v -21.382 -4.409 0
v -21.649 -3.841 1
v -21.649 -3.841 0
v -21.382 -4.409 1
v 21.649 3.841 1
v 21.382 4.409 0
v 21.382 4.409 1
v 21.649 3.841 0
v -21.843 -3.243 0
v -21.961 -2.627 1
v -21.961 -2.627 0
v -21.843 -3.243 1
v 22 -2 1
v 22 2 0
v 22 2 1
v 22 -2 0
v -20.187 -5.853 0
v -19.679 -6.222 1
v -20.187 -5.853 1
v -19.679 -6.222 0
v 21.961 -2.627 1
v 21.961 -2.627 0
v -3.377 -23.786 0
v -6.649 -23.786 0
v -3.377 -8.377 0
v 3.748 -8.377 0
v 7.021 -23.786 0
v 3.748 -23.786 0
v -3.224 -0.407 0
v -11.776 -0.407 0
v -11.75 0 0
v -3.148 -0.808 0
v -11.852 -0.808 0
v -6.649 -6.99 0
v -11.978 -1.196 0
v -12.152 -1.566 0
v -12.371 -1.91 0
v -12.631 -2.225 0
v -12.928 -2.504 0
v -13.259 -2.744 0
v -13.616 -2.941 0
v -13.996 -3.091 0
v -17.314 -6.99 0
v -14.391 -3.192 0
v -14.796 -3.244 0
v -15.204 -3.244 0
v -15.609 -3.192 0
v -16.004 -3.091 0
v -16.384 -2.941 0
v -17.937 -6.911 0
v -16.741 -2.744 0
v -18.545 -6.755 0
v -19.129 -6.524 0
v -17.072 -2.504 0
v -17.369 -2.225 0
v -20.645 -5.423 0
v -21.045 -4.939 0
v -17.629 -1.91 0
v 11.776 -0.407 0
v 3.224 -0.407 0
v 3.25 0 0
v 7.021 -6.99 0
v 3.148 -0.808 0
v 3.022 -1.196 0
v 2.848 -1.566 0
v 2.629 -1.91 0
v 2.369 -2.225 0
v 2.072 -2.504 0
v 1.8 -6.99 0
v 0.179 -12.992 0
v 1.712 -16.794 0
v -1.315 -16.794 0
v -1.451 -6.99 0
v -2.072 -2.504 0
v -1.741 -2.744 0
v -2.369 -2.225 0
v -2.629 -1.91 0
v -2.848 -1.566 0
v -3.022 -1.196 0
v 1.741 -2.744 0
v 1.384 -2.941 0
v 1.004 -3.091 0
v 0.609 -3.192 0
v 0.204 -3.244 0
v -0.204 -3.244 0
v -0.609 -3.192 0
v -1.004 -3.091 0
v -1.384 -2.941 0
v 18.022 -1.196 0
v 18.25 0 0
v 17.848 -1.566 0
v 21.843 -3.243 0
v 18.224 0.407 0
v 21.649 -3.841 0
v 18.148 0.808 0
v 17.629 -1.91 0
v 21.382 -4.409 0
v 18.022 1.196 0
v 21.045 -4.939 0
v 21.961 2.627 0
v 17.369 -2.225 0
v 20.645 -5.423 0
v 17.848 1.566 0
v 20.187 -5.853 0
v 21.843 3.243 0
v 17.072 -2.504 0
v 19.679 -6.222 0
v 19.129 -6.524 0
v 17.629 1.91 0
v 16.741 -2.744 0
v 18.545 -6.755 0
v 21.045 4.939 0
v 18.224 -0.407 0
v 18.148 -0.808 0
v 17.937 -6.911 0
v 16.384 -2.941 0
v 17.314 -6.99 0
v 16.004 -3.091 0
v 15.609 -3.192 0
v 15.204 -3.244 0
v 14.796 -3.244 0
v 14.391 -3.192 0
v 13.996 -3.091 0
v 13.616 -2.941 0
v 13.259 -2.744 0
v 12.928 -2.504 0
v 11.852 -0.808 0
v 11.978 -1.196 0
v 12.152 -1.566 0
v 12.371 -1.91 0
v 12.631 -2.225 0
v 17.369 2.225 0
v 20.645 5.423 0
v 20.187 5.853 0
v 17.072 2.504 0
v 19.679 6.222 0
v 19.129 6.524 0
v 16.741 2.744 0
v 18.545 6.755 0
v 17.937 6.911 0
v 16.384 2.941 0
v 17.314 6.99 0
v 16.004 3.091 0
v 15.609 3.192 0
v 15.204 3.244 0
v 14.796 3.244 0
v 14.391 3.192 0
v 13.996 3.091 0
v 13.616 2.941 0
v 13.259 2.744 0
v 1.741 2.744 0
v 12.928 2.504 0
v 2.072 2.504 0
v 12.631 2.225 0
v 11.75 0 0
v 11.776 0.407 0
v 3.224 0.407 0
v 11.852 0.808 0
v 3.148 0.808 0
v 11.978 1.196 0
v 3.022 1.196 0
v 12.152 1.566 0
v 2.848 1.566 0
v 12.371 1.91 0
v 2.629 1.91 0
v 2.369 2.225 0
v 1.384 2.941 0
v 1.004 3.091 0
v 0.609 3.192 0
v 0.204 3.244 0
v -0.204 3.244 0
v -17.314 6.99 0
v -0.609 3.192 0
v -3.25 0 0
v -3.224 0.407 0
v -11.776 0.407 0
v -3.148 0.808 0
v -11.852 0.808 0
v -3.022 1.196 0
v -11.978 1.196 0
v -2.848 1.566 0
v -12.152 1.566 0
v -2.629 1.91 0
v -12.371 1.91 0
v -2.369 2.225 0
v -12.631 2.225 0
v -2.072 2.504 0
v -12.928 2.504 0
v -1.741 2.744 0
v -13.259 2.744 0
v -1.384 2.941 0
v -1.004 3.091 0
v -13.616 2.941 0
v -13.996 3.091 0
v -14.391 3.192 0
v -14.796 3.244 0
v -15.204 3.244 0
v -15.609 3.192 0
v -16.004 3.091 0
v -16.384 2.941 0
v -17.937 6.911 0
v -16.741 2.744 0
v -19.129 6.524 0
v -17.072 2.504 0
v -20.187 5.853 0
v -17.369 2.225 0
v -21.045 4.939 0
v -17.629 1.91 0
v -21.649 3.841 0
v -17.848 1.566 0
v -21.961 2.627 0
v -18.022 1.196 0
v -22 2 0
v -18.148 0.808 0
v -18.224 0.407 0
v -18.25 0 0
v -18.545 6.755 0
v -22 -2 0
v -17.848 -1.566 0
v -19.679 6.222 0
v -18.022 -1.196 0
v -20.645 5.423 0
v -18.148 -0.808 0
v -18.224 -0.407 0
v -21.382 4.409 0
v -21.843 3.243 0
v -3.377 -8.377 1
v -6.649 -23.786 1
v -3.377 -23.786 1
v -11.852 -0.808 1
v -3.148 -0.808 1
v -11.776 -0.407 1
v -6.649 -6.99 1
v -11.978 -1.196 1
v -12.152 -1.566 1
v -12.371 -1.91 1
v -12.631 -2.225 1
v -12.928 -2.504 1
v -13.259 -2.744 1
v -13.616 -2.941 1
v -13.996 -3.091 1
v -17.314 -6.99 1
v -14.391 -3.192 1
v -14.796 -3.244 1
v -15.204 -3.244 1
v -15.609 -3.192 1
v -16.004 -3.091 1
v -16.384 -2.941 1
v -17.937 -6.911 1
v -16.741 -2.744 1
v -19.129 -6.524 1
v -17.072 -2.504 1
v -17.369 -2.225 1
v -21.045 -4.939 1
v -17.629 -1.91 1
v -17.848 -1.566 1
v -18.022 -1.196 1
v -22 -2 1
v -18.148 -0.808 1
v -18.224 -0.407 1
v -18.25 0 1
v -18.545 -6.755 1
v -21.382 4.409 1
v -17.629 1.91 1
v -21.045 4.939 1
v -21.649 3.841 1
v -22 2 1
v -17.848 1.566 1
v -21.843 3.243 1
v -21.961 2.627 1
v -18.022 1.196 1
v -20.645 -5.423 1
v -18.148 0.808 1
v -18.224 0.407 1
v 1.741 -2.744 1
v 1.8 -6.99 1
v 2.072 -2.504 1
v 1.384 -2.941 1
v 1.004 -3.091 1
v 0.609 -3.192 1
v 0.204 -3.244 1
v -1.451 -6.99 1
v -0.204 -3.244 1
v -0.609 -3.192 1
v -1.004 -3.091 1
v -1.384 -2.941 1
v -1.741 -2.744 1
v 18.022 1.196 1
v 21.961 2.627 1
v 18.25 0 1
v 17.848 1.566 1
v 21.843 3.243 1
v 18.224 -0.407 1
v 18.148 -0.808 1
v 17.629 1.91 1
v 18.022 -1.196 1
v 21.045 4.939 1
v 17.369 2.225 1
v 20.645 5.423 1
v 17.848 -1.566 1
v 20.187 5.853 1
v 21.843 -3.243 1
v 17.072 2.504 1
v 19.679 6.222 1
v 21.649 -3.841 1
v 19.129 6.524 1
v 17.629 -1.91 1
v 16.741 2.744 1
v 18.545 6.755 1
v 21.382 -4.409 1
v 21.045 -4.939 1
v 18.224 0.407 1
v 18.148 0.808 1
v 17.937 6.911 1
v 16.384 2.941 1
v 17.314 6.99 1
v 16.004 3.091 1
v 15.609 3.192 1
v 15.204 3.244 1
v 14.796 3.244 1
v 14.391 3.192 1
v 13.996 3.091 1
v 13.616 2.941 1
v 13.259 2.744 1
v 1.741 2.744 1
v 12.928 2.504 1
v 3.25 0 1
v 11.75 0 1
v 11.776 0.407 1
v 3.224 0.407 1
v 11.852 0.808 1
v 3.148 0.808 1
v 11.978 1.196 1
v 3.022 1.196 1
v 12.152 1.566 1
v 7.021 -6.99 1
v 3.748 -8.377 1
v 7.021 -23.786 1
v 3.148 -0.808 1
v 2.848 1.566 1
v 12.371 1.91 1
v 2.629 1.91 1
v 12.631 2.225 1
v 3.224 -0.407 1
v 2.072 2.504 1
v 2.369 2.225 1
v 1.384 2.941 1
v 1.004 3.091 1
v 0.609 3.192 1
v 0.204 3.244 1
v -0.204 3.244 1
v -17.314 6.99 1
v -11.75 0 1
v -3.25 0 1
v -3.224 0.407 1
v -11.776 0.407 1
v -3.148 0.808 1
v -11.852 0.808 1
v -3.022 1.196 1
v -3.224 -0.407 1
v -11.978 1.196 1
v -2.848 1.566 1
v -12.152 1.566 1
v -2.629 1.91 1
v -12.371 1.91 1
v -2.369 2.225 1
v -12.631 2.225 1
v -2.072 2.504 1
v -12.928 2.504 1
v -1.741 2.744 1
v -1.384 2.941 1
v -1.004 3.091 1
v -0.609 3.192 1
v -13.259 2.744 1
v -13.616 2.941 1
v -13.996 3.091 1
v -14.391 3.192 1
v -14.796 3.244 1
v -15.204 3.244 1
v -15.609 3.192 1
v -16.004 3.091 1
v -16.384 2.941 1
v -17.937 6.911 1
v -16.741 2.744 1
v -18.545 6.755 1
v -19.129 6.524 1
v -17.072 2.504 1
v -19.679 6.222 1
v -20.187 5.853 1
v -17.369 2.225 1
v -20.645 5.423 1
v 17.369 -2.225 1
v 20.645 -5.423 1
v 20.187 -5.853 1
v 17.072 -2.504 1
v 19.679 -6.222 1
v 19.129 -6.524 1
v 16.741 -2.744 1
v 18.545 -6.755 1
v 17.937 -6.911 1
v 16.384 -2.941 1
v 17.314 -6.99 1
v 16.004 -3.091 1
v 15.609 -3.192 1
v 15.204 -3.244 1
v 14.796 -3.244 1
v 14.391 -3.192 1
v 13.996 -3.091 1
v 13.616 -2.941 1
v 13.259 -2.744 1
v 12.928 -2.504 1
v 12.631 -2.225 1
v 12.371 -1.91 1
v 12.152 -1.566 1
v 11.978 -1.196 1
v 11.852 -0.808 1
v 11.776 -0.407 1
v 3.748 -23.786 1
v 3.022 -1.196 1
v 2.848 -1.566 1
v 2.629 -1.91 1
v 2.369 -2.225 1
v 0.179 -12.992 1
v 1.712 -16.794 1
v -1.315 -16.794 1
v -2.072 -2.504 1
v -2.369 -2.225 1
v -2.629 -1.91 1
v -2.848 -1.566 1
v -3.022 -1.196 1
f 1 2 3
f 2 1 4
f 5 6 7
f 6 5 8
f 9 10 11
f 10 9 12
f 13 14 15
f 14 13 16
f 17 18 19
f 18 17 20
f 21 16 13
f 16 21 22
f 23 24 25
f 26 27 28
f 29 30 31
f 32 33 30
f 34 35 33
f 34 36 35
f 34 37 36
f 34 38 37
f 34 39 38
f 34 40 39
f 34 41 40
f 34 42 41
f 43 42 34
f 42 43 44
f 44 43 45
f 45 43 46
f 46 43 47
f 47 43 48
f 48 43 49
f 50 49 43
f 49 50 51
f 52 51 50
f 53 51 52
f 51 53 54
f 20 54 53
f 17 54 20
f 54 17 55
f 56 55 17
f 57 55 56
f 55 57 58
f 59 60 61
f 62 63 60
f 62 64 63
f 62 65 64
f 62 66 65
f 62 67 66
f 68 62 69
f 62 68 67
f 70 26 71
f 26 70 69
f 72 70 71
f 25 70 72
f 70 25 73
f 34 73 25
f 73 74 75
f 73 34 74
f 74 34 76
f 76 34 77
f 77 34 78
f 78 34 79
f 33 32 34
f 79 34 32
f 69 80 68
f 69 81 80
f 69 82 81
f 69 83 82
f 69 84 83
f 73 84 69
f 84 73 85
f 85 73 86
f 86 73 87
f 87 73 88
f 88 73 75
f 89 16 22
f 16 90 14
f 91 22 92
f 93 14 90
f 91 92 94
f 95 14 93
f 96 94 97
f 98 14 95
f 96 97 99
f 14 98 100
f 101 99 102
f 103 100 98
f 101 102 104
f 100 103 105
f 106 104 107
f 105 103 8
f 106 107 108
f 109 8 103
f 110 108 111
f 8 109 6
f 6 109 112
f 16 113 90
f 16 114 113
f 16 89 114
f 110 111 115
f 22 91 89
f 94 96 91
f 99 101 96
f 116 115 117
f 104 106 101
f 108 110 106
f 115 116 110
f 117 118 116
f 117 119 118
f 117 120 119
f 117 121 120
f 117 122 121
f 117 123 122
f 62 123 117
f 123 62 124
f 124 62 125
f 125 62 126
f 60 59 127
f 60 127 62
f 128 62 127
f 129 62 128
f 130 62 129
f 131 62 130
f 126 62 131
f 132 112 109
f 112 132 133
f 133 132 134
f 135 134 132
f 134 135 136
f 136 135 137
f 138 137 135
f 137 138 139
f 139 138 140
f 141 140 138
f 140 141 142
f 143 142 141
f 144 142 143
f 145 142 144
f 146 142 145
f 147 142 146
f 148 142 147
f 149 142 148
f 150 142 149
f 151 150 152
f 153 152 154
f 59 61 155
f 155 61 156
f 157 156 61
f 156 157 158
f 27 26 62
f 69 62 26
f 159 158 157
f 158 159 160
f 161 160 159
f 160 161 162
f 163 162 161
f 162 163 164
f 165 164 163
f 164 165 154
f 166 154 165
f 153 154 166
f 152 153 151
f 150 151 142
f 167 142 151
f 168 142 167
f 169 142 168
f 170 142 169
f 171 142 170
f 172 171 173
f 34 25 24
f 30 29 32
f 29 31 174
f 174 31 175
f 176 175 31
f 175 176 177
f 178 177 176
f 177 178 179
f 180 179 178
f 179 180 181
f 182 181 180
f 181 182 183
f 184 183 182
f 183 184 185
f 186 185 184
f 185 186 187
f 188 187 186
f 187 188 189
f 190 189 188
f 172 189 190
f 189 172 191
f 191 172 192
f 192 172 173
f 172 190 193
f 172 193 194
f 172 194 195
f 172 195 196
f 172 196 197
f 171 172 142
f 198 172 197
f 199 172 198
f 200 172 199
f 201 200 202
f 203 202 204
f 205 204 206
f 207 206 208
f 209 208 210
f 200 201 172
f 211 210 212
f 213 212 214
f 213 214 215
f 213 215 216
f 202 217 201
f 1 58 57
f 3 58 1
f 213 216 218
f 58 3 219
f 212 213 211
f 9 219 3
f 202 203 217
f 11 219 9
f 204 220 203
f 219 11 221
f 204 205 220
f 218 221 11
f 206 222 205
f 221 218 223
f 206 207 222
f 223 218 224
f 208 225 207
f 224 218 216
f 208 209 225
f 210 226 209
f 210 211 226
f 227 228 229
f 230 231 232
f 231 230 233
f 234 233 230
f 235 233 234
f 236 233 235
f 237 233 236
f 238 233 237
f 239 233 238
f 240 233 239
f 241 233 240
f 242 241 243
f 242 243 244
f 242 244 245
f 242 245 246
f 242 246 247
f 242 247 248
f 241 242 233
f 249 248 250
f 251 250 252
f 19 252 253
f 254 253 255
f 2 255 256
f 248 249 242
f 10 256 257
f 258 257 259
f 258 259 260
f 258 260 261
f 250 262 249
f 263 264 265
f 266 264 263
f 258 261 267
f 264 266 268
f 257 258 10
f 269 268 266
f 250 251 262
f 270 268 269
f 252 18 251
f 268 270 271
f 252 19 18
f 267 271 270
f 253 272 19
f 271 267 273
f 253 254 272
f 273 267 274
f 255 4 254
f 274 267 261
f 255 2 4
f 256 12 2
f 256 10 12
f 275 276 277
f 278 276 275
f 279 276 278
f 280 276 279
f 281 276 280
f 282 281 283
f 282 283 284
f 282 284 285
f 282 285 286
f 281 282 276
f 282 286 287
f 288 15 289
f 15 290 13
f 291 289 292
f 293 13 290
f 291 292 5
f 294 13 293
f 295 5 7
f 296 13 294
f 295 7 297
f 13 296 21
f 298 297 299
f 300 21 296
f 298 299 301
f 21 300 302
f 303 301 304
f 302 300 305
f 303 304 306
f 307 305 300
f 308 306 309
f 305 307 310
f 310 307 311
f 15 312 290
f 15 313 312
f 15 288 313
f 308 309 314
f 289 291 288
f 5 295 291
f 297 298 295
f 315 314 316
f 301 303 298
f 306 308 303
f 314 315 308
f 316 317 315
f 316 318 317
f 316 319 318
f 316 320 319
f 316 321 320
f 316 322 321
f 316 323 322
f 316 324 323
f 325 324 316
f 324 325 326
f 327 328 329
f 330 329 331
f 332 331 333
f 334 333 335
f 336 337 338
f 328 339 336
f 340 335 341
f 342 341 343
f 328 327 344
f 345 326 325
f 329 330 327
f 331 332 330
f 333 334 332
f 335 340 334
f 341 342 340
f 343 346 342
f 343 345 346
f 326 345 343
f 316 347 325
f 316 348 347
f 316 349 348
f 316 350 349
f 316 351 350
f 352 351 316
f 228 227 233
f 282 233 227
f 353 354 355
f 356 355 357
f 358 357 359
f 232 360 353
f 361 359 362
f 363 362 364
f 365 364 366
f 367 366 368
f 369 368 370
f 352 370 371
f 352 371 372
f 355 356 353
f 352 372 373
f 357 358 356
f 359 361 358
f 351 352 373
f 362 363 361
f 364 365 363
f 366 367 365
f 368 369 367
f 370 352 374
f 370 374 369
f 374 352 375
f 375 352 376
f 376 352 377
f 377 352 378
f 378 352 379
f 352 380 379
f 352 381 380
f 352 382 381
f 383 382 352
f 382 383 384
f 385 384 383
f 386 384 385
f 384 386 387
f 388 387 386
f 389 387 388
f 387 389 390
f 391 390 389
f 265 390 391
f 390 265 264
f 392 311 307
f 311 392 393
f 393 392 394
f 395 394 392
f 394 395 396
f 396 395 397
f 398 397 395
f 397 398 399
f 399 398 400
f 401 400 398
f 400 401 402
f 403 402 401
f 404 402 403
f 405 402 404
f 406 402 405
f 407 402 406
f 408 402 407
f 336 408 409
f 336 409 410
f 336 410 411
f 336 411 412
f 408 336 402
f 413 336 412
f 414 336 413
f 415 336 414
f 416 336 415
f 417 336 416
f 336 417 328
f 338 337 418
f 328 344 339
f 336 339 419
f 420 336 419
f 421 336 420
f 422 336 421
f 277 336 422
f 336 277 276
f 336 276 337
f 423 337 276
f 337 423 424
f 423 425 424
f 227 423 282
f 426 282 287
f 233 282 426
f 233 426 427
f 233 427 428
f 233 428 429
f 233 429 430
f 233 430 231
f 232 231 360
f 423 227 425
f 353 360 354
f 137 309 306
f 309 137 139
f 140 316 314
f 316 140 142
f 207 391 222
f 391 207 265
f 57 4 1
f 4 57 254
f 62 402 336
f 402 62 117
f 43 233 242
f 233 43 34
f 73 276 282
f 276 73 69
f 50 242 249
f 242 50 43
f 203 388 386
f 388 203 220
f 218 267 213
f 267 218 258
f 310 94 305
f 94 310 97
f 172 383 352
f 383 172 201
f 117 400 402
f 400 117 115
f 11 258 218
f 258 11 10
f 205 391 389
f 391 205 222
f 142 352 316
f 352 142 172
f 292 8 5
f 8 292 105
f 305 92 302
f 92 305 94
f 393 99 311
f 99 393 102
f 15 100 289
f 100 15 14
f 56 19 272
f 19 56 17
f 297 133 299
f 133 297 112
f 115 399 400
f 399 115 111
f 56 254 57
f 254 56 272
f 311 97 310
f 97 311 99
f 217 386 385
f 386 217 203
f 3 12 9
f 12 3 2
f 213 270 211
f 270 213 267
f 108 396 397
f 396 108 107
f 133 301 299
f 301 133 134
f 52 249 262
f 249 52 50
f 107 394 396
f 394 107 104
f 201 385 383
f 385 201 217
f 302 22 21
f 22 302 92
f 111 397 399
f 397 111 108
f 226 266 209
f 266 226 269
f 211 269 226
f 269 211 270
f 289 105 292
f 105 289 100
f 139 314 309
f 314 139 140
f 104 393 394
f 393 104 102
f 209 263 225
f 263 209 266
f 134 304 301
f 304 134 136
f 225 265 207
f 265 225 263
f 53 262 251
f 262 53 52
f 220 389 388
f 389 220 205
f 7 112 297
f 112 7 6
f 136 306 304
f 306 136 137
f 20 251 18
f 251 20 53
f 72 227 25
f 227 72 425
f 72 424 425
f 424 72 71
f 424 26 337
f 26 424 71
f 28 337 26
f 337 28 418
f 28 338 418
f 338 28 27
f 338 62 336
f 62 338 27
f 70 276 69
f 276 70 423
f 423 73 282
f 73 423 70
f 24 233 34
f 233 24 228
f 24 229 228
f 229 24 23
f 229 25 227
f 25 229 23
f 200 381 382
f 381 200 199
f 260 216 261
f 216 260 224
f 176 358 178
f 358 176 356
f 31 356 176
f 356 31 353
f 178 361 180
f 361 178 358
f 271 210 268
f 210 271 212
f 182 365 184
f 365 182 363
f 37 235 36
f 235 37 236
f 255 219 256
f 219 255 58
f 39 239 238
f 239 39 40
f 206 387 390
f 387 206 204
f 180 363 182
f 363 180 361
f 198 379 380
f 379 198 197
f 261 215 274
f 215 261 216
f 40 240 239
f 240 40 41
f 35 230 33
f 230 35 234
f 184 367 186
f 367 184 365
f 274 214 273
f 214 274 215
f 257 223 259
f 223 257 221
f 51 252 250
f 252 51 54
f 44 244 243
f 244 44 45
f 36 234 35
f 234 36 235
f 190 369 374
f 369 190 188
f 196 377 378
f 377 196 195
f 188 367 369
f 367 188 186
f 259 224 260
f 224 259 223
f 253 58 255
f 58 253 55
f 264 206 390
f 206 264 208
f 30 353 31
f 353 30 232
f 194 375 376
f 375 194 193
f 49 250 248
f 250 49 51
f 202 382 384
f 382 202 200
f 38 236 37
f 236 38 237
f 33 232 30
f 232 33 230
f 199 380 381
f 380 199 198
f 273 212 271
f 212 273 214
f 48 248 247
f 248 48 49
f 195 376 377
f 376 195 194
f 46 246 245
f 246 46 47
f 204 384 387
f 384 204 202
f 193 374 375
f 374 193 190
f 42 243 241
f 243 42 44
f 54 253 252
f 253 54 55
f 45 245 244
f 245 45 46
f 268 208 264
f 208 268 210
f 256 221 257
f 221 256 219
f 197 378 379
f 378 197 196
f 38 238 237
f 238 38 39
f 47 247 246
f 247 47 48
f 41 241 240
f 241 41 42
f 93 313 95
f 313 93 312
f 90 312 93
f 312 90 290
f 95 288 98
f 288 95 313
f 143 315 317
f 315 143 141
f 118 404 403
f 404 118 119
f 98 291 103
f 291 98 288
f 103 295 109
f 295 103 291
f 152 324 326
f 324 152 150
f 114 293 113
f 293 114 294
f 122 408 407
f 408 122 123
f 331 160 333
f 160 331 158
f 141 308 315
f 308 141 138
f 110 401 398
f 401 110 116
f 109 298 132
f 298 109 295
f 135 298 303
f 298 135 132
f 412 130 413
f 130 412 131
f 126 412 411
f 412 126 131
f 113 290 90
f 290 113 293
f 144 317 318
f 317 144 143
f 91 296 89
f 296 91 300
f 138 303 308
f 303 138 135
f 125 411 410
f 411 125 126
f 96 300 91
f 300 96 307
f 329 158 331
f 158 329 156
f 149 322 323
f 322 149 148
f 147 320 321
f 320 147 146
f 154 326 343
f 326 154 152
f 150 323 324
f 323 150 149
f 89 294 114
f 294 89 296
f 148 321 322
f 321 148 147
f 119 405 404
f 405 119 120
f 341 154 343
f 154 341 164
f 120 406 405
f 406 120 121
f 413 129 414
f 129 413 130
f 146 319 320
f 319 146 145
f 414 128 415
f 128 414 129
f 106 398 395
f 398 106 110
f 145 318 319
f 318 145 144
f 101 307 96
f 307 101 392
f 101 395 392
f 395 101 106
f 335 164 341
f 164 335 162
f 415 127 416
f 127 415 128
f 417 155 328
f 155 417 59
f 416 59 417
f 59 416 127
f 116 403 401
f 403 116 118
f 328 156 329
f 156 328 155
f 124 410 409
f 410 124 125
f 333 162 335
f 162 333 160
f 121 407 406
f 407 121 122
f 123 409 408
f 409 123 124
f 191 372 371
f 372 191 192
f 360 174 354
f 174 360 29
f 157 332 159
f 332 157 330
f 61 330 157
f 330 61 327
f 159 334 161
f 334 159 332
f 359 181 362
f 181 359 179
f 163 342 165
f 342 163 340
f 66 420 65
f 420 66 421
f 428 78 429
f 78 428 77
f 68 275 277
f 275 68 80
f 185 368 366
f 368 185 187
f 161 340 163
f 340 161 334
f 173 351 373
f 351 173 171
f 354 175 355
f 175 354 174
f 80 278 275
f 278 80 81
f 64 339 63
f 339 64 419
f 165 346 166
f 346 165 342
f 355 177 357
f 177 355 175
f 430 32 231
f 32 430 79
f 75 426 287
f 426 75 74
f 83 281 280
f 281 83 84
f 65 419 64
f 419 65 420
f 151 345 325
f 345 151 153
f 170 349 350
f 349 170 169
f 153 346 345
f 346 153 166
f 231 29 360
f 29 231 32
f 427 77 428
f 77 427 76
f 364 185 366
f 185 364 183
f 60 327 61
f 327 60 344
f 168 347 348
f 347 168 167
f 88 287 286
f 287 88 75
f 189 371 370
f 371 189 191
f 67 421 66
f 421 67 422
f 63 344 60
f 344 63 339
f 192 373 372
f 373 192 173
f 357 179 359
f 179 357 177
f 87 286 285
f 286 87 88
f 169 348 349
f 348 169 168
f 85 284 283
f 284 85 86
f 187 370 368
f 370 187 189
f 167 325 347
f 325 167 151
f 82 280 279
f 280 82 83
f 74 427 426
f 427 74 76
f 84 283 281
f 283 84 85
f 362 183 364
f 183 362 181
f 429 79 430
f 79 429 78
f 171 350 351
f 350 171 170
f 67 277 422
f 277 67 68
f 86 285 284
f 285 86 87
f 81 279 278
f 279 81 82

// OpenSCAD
$fn = 50;


difference() {
	union() {
		translate(v = [0, 0, 0]) {
			rotate(a = [0, 0, 0]) {
				hull() {
					translate(v = [-17.0000000000, 2.0000000000, 0]) {
						rotate(a = [0, 0, 0]) {
							translate(v = [0, 0, 0]) {
								rotate(a = [0, 0, 0]) {
									cylinder(h = 1, r = 5);
								}
							}
						}
					}
					translate(v = [17.0000000000, 2.0000000000, 0]) {
						rotate(a = [0, 0, 0]) {
							translate(v = [0, 0, 0]) {
								rotate(a = [0, 0, 0]) {
									cylinder(h = 1, r = 5);
								}
							}
						}
					}
					translate(v = [-17.0000000000, -2.0000000000, 0]) {
						rotate(a = [0, 0, 0]) {
							translate(v = [0, 0, 0]) {
								rotate(a = [0, 0, 0]) {
									cylinder(h = 1, r = 5);
								}
							}
						}
					}
					translate(v = [17.0000000000, -2.0000000000, 0]) {
						rotate(a = [0, 0, 0]) {
							translate(v = [0, 0, 0]) {
								rotate(a = [0, 0, 0]) {
									cylinder(h = 1, r = 5);
								}
							}
						}
					}
				}
			}
		}
		translate(v = [0, -5, 0]) {
			rotate(a = [0, 0, 0]) {
				linear_extrude(height = 1) {
					text(font = "DejaVu Sans Mono:style=Bold", halign = "center", size = 19.0000000000, text = "M", valign = "top");
				}
			}
		}
	}
	union() {
		translate(v = [-15.0000000000, 0.0000000000, -125.0000000000]) {
			rotate(a = [0, 0, 0]) {
				cylinder(h = 250, r = 3.2500000000);
			}
		}
		translate(v = [15.0000000000, 0.0000000000, -125.0000000000]) {
			rotate(a = [0, 0, 0]) {
				cylinder(h = 250, r = 3.2500000000);
			}
		}
		translate(v = [15.0000000000, 0.0000000000, -125.0000000000]) {
			rotate(a = [0, 0, 0]) {
				cylinder(h = 250, r = 3.2500000000);
			}
		}
		translate(v = [0, 0, -125.0000000000]) {
			rotate(a = [0, 0, 0]) {
				cylinder(h = 250, r = 3.2500000000);
			}
		}
	}
}
